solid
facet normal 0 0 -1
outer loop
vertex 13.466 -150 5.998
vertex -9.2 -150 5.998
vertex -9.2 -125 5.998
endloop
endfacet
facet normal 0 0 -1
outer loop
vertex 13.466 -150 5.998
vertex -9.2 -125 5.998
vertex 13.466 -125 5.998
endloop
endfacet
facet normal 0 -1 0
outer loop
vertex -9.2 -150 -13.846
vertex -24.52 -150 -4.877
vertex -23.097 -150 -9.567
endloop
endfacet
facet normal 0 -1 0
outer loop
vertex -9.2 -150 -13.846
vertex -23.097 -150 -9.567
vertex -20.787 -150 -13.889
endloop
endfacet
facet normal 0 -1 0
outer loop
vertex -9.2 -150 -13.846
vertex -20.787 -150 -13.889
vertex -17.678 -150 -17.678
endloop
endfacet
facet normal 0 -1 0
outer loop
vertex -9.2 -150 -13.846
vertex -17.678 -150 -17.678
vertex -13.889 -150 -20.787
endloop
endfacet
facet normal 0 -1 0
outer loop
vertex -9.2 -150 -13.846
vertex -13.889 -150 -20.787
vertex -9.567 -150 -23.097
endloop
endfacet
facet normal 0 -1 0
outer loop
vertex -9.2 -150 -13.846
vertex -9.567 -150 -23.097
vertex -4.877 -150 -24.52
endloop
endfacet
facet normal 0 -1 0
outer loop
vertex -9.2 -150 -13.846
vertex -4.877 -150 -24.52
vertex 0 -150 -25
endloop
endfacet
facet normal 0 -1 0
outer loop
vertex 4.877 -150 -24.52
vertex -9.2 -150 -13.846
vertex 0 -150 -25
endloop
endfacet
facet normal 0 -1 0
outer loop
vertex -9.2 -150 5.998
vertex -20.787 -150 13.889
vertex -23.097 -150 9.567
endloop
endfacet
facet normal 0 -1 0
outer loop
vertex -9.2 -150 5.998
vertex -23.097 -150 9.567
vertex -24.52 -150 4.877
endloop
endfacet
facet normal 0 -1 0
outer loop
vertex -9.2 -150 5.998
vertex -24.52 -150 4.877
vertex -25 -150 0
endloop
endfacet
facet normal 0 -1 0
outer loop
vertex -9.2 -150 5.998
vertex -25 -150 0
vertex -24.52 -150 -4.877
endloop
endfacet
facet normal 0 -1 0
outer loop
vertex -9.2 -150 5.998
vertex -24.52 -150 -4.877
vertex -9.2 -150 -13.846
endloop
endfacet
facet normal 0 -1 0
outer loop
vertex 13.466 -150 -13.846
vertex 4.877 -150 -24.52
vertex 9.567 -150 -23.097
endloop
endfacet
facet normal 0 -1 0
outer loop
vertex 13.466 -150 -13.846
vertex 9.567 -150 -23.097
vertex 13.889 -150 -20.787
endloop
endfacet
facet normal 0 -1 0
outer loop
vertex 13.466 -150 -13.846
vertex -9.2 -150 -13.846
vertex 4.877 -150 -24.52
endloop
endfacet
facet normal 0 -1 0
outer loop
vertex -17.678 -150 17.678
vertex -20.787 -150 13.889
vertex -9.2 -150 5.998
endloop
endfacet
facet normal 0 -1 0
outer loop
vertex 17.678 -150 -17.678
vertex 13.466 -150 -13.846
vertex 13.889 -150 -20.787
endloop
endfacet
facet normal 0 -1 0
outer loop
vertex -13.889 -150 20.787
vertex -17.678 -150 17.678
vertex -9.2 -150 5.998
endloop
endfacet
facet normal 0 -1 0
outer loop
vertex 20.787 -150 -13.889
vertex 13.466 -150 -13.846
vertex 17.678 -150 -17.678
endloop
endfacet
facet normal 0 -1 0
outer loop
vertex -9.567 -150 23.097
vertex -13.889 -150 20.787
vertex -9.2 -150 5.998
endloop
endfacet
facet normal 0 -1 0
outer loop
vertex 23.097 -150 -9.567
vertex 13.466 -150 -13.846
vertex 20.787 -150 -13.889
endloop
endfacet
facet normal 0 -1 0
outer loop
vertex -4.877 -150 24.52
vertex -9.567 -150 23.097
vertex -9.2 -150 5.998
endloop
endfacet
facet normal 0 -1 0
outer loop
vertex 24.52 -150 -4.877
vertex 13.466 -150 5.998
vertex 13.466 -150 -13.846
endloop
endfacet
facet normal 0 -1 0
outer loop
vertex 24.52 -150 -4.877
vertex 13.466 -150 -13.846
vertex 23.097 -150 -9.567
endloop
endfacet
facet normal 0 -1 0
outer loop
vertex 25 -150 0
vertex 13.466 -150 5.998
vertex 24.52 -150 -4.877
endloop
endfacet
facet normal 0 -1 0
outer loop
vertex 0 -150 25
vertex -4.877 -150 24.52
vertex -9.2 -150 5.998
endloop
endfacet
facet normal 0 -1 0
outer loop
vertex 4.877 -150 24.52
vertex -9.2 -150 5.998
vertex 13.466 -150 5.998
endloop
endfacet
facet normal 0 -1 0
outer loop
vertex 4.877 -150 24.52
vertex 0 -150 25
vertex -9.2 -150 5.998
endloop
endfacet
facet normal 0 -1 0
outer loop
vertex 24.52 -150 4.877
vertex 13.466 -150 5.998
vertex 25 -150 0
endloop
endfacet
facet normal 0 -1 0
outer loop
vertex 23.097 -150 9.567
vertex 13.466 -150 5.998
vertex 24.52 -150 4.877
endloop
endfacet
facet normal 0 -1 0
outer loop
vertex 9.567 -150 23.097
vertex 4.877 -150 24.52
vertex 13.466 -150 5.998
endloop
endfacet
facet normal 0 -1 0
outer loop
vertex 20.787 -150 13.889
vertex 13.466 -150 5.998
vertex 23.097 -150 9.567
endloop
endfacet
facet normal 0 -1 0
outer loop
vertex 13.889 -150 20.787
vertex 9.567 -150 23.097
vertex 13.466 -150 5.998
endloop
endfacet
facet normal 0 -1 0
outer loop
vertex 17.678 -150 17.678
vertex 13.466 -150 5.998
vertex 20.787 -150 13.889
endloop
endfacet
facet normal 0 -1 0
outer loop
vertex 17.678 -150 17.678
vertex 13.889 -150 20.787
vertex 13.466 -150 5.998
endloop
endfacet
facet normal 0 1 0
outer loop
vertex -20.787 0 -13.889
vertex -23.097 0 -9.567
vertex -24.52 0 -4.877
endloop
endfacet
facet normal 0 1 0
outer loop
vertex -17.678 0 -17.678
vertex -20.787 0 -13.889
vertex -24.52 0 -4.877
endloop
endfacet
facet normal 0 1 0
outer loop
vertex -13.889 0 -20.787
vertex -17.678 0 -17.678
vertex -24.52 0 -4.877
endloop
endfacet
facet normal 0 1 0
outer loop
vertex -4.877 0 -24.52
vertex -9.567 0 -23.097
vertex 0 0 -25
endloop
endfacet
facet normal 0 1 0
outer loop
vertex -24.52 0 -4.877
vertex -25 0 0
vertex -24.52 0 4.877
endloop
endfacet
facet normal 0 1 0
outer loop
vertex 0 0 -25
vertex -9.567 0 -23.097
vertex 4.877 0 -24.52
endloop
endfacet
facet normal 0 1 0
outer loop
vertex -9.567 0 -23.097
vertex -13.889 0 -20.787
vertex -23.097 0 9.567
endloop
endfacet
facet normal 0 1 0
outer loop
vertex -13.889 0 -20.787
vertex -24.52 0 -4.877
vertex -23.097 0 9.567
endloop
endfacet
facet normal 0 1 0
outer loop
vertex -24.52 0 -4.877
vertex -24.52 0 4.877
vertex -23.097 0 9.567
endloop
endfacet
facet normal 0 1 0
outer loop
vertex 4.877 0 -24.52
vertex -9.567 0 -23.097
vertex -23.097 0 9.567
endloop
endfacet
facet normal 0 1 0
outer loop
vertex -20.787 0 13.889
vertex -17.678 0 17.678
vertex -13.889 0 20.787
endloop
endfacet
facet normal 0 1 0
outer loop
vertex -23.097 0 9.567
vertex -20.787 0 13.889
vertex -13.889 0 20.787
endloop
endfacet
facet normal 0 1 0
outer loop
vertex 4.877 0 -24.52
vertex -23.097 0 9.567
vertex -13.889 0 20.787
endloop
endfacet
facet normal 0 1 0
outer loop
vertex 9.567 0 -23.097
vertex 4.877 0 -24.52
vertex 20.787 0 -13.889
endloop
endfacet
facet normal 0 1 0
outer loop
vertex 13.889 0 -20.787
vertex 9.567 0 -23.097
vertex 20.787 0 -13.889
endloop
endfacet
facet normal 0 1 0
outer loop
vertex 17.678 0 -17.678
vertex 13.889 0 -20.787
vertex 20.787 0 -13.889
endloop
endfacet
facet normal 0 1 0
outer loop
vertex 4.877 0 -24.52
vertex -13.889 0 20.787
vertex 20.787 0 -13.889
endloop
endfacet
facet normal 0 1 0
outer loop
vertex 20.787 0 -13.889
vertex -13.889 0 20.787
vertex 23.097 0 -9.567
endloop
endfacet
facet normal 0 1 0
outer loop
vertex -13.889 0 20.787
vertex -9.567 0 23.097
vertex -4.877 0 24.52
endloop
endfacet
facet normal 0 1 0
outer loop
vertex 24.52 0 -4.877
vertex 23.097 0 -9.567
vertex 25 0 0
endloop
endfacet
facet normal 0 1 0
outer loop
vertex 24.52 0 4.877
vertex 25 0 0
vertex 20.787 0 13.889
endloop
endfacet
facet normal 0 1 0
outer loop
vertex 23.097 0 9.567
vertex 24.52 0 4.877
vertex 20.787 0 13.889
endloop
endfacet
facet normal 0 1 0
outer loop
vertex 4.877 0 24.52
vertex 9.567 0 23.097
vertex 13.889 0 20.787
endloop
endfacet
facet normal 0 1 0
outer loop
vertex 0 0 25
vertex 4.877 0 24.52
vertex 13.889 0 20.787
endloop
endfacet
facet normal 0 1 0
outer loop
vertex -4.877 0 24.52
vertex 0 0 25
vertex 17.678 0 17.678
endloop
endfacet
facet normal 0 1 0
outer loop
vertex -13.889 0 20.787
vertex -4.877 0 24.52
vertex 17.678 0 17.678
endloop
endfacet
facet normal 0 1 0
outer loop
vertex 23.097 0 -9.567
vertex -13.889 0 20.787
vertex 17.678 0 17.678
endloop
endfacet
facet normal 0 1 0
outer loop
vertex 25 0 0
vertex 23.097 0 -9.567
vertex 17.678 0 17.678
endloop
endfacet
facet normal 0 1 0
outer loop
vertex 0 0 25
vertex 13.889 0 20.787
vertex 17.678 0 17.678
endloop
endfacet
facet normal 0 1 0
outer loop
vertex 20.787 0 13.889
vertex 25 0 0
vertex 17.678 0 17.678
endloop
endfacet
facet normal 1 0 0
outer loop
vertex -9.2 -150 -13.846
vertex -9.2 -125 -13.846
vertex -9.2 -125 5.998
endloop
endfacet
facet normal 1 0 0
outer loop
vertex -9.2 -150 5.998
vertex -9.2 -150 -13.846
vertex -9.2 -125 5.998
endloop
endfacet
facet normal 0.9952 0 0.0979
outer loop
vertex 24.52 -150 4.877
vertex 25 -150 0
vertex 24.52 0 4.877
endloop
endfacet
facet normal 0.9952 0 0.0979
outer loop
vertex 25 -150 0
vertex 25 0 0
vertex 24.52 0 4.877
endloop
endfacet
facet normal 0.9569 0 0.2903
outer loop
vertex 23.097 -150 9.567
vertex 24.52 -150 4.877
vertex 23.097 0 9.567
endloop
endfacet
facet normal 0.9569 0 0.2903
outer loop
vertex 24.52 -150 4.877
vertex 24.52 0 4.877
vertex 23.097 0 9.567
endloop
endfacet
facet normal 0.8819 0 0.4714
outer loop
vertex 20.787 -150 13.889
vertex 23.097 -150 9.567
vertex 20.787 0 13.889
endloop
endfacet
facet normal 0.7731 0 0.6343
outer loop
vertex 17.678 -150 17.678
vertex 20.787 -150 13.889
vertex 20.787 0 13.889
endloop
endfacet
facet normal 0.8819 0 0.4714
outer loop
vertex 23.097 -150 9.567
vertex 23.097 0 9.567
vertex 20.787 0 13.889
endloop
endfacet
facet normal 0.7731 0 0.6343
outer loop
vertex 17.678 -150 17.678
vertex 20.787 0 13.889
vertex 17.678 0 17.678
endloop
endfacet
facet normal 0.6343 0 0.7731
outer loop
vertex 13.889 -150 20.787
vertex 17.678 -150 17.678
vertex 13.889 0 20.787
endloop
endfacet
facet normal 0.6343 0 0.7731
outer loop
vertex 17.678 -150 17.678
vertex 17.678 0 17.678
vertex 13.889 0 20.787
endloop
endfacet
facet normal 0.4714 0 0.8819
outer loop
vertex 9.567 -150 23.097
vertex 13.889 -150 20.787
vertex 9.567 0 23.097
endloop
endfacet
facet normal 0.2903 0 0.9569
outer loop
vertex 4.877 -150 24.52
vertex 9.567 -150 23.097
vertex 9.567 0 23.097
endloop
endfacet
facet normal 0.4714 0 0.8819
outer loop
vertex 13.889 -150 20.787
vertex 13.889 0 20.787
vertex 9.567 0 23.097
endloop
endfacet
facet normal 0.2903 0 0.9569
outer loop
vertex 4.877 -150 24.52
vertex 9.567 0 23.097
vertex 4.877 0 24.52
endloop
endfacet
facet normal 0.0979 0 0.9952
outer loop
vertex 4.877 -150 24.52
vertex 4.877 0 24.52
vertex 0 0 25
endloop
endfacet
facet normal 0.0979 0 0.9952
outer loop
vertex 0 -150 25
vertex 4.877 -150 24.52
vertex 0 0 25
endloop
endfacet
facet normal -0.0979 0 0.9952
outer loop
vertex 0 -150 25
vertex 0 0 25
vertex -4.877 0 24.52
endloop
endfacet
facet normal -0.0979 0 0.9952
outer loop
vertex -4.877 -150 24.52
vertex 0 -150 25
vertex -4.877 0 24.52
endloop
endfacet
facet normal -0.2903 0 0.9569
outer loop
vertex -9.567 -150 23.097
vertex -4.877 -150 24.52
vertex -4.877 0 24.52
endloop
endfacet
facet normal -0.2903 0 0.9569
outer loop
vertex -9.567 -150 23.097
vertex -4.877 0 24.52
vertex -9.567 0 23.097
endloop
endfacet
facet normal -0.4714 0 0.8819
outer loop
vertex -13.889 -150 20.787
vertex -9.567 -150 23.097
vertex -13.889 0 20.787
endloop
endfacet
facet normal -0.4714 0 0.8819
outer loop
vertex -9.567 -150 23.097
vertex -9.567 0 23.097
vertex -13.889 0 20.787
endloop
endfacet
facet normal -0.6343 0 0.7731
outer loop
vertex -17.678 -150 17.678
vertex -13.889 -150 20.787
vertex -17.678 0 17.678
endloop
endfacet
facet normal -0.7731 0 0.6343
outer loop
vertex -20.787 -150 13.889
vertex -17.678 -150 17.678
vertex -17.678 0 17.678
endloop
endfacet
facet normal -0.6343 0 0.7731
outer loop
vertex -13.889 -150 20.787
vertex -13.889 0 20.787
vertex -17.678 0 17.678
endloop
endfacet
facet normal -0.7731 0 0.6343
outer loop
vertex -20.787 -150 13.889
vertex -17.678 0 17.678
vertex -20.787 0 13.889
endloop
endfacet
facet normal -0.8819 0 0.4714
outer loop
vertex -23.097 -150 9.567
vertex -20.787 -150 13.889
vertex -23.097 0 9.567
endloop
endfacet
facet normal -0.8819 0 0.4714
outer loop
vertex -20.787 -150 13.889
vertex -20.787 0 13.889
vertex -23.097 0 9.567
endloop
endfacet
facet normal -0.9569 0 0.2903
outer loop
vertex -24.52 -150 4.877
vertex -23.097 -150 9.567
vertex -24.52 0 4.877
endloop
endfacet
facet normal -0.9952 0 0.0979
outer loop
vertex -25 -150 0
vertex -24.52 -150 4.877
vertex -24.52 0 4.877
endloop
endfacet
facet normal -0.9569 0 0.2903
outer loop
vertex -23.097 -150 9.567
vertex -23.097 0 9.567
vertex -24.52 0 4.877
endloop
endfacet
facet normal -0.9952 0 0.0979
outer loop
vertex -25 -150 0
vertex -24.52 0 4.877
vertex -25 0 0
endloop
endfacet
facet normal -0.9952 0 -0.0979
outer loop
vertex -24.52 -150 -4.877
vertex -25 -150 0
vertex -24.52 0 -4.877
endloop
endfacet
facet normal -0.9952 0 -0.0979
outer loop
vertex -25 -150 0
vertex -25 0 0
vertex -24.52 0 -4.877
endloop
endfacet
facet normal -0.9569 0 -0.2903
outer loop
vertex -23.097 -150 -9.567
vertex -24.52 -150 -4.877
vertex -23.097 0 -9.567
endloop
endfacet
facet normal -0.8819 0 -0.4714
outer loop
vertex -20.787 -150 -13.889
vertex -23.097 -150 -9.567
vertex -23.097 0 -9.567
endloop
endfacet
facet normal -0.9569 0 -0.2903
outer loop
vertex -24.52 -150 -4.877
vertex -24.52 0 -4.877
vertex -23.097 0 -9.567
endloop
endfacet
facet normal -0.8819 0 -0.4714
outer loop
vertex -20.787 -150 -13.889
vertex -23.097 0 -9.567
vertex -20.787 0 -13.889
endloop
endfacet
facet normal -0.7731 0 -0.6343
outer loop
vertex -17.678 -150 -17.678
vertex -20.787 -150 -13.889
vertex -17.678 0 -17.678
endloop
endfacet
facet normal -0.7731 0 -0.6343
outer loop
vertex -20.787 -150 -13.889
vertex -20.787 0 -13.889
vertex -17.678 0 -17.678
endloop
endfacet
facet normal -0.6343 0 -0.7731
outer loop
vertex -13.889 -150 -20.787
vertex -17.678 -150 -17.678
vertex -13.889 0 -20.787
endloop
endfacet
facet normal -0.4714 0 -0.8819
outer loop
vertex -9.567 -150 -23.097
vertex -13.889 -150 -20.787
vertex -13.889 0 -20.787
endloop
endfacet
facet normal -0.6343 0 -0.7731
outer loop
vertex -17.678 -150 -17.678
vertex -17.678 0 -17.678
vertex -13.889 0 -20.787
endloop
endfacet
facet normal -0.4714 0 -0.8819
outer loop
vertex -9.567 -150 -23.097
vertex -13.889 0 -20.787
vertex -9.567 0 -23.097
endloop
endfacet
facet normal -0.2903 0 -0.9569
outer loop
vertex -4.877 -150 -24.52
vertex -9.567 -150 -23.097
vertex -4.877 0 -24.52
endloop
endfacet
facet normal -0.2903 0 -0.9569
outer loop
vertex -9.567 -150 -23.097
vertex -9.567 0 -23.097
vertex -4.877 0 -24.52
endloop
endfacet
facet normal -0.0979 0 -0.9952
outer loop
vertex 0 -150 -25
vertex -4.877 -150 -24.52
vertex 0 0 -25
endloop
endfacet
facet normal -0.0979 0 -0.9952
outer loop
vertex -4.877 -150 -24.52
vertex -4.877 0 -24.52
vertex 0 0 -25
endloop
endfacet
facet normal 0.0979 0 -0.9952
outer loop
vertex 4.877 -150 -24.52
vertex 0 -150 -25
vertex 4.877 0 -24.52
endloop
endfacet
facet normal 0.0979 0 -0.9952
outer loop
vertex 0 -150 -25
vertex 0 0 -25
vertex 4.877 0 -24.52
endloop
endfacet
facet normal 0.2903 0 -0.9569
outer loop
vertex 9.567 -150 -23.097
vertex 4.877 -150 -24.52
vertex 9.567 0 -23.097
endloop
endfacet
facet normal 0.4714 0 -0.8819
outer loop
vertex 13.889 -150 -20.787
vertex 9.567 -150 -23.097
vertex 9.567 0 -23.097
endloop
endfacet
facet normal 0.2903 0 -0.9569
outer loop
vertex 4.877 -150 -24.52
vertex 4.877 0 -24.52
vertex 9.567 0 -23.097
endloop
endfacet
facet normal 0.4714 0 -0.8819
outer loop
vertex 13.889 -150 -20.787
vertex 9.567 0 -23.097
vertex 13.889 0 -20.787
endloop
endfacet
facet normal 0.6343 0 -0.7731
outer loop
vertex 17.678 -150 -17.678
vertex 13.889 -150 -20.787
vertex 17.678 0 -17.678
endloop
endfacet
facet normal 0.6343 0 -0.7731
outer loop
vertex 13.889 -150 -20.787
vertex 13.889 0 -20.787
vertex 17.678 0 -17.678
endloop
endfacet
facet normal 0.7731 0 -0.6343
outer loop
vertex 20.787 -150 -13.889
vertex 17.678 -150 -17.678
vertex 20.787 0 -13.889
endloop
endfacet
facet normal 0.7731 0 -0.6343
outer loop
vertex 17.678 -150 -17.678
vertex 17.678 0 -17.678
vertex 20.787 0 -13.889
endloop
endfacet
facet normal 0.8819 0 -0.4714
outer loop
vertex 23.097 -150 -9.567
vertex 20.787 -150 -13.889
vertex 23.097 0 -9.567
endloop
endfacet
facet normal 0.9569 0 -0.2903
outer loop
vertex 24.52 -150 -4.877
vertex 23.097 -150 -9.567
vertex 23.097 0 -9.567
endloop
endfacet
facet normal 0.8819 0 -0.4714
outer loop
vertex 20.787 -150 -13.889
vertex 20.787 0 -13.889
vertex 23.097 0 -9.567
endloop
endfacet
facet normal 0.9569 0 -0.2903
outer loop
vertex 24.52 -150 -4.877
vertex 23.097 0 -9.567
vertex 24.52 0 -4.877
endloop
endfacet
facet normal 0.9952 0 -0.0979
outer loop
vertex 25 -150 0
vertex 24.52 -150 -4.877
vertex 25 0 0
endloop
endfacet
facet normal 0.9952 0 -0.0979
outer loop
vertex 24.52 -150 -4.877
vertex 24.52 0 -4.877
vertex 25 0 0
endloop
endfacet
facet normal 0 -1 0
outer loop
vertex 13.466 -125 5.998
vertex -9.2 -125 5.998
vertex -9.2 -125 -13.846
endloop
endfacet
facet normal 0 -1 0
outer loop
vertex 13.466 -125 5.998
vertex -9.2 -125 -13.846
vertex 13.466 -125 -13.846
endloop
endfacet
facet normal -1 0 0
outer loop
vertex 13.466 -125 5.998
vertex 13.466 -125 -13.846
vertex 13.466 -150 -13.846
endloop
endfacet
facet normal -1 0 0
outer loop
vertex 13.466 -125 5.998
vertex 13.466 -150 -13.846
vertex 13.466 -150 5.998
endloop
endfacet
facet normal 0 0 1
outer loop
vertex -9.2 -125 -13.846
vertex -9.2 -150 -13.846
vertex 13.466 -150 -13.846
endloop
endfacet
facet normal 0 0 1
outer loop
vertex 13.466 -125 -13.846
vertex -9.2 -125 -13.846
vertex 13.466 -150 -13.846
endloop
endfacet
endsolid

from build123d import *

# Parameters (mm, degrees)
F0_R     = 25
F1_DEPTH = 100
F2_DEPTH = 25
F3_R     = 25
F3_W     = 22.6668892428
F3_H     = 19.8441343382
F4_DEPTH = 25


with BuildPart() as f1:
    # F0 (on Front) → F1 (new body)
    with BuildSketch(Plane.XZ):
        Circle(F0_R)
    extrude(amount=F1_DEPTH)

    # F2 (add): a face of the model
    f2_faces = [f1.faces().sort_by_distance(p)[0] for p in [
        (0, -100, 0),
    ]]
    extrude(f2_faces, amount=F2_DEPTH)

    # F3 (on face) → F4 (join)
    with BuildSketch(Plane.XZ.offset(125)):
        Circle(F3_R)
        with Locations((2.1329852752, -3.9242249914)):
            Rectangle(F3_W, F3_H, mode=Mode.SUBTRACT)
    extrude(amount=F4_DEPTH)


solid = f1.part
